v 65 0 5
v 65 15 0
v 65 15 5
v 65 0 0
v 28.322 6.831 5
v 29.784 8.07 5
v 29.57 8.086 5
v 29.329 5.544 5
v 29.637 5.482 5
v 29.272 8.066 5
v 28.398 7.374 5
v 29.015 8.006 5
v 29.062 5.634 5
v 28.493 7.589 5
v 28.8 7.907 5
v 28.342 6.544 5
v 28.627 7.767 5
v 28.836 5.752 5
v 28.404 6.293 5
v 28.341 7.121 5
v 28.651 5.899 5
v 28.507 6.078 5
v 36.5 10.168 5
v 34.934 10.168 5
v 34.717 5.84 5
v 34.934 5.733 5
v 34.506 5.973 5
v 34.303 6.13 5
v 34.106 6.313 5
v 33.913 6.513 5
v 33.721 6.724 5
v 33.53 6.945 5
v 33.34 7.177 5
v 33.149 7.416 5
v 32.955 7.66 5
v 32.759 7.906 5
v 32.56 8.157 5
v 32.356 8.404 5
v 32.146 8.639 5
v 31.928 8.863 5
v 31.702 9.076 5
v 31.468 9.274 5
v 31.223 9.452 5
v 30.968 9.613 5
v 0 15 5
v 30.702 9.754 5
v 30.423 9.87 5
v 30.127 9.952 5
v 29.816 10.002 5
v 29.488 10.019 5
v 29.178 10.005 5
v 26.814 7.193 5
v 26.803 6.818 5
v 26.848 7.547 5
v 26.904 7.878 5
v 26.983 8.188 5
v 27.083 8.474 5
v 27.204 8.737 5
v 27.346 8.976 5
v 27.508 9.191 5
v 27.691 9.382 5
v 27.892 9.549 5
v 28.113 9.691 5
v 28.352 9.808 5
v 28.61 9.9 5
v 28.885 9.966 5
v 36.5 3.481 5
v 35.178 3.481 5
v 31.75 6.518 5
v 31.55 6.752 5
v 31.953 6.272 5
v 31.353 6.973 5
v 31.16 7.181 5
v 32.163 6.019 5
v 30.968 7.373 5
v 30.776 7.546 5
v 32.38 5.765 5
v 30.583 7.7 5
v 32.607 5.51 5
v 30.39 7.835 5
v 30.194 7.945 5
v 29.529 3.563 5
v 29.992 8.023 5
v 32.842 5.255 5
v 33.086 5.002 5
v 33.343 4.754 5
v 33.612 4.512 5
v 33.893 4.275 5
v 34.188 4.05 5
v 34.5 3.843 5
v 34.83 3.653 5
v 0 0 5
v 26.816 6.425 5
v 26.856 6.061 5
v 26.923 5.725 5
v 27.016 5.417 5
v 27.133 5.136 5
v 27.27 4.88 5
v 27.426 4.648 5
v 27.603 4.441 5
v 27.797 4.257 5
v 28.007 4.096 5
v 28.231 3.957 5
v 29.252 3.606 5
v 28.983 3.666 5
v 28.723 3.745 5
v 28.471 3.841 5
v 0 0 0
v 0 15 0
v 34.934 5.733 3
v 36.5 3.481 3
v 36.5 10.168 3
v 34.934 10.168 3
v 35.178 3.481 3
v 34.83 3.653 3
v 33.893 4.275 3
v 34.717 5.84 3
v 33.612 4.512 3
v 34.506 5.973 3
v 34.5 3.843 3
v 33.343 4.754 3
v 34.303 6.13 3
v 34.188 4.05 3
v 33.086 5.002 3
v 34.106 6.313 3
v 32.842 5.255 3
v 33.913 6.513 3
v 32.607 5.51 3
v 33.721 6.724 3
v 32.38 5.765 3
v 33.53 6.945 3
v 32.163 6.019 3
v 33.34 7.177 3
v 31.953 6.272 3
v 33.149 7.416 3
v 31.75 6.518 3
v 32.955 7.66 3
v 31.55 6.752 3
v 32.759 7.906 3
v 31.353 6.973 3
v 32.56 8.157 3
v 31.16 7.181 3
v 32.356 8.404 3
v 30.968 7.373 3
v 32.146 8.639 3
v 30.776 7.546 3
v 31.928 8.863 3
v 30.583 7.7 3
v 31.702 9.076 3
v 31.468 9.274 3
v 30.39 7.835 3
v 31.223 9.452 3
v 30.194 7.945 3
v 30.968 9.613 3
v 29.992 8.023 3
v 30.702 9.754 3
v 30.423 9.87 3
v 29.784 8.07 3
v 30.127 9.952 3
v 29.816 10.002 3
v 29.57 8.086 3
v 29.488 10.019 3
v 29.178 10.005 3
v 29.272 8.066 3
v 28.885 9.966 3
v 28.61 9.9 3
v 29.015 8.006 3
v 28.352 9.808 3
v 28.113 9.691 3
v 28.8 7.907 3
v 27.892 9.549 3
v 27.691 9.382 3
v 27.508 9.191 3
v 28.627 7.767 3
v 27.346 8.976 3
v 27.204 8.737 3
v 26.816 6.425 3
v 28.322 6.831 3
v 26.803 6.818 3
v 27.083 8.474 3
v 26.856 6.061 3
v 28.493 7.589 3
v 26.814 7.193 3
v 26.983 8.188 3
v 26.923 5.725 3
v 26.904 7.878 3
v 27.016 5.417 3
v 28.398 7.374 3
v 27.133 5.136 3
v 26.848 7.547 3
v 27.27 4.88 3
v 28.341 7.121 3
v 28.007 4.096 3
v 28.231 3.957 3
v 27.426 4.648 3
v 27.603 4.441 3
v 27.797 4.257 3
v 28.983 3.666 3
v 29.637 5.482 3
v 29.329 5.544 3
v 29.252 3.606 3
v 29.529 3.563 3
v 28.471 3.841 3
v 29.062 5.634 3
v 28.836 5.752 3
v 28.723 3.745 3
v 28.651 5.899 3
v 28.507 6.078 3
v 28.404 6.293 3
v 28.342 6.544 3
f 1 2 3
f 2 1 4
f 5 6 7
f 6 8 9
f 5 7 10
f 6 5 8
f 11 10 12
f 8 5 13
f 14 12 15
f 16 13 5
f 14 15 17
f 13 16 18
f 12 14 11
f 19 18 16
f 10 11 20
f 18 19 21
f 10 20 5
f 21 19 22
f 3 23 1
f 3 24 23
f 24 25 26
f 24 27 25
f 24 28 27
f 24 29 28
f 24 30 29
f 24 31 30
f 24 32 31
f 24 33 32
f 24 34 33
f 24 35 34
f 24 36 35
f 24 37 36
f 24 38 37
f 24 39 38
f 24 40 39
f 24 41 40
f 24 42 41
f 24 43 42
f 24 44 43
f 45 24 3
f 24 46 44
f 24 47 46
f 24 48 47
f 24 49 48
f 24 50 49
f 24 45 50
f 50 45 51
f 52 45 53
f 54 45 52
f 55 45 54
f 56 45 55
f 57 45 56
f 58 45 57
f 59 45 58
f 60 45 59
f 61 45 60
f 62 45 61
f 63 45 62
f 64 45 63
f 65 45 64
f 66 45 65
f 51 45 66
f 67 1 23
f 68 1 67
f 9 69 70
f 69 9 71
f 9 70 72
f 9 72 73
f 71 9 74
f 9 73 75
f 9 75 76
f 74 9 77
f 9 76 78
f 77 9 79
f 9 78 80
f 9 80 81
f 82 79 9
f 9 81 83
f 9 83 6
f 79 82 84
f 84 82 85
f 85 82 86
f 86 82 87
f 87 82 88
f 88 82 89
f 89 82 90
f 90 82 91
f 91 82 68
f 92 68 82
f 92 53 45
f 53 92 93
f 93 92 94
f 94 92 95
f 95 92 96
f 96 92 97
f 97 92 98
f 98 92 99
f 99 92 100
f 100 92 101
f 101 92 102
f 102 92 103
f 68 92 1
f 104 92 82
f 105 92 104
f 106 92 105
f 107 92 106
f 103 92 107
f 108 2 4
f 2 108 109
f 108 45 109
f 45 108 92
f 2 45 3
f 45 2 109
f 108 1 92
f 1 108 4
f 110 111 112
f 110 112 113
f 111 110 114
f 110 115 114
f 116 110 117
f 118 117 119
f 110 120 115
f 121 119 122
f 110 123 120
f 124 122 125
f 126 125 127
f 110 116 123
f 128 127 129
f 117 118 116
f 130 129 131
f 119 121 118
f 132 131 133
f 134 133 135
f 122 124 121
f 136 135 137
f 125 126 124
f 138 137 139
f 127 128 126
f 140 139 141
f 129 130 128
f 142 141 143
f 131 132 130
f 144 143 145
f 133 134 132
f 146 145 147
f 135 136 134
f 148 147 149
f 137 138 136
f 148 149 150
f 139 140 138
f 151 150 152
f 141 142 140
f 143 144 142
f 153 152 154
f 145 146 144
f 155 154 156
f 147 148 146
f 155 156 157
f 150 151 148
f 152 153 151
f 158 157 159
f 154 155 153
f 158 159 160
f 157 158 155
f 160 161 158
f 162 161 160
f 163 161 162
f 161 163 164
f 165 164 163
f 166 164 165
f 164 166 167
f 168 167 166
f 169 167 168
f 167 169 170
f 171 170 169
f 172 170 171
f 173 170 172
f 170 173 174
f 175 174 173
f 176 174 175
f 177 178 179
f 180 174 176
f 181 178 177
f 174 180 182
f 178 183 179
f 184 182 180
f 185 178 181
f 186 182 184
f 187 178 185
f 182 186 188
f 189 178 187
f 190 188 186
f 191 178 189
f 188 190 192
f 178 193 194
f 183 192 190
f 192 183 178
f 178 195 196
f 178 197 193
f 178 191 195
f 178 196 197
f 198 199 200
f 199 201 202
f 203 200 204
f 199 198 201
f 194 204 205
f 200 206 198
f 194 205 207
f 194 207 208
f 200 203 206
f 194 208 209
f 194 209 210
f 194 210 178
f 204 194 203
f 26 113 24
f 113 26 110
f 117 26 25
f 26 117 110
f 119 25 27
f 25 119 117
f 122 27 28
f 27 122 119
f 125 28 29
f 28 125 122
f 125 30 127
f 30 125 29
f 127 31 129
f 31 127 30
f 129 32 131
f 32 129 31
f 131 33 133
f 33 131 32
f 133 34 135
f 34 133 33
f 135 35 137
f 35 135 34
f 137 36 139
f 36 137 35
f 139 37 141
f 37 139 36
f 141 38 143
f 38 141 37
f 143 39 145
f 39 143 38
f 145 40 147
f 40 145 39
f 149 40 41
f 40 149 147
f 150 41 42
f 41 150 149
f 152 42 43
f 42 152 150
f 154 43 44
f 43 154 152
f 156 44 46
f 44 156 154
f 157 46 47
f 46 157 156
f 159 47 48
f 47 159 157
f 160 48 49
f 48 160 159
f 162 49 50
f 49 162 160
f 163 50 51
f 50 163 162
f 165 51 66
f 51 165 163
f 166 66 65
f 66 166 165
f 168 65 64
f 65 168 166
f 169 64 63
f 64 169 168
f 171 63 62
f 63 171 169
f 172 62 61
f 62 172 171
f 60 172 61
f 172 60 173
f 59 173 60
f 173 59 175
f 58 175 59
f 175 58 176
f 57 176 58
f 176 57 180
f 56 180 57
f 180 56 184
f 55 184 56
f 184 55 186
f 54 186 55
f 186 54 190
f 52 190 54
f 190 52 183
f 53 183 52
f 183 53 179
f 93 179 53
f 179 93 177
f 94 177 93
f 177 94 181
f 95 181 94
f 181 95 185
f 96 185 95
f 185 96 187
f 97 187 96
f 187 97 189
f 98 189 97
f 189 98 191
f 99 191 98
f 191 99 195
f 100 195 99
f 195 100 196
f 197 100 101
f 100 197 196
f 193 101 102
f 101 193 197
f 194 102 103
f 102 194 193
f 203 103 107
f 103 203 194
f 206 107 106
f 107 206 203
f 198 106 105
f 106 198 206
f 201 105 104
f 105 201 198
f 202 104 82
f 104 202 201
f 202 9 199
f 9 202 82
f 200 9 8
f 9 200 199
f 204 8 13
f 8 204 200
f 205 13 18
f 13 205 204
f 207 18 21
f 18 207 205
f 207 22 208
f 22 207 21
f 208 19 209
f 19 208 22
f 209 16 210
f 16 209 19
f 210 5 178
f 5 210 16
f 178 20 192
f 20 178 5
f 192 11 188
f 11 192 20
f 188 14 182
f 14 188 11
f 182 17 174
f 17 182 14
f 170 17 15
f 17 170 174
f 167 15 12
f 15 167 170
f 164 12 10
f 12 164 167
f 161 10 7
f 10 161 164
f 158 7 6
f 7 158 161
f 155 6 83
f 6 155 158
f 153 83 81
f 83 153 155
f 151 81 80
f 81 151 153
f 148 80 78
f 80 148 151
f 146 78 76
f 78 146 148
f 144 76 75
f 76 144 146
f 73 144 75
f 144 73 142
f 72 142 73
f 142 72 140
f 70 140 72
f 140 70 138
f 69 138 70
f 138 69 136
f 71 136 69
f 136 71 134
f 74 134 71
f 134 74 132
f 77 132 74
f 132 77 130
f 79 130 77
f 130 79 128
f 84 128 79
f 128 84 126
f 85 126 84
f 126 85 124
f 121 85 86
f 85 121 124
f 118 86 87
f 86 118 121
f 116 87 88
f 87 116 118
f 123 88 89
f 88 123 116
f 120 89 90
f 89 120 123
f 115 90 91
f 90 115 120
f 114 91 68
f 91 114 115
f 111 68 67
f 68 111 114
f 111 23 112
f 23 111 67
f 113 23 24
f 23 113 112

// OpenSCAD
difference(){
	union(){ 
        translate([0,0,0]){
           cube([65,15,5], center=false);
        }                
	}
	union() {
        translate([60-65/2+9, 3,3]){
            linear_extrude(height = 10) {
                rotate([0,0,90]){
                    text("2", size = 10, font="Arial:style=Bold");
                }
            }
        }                


	}
}
